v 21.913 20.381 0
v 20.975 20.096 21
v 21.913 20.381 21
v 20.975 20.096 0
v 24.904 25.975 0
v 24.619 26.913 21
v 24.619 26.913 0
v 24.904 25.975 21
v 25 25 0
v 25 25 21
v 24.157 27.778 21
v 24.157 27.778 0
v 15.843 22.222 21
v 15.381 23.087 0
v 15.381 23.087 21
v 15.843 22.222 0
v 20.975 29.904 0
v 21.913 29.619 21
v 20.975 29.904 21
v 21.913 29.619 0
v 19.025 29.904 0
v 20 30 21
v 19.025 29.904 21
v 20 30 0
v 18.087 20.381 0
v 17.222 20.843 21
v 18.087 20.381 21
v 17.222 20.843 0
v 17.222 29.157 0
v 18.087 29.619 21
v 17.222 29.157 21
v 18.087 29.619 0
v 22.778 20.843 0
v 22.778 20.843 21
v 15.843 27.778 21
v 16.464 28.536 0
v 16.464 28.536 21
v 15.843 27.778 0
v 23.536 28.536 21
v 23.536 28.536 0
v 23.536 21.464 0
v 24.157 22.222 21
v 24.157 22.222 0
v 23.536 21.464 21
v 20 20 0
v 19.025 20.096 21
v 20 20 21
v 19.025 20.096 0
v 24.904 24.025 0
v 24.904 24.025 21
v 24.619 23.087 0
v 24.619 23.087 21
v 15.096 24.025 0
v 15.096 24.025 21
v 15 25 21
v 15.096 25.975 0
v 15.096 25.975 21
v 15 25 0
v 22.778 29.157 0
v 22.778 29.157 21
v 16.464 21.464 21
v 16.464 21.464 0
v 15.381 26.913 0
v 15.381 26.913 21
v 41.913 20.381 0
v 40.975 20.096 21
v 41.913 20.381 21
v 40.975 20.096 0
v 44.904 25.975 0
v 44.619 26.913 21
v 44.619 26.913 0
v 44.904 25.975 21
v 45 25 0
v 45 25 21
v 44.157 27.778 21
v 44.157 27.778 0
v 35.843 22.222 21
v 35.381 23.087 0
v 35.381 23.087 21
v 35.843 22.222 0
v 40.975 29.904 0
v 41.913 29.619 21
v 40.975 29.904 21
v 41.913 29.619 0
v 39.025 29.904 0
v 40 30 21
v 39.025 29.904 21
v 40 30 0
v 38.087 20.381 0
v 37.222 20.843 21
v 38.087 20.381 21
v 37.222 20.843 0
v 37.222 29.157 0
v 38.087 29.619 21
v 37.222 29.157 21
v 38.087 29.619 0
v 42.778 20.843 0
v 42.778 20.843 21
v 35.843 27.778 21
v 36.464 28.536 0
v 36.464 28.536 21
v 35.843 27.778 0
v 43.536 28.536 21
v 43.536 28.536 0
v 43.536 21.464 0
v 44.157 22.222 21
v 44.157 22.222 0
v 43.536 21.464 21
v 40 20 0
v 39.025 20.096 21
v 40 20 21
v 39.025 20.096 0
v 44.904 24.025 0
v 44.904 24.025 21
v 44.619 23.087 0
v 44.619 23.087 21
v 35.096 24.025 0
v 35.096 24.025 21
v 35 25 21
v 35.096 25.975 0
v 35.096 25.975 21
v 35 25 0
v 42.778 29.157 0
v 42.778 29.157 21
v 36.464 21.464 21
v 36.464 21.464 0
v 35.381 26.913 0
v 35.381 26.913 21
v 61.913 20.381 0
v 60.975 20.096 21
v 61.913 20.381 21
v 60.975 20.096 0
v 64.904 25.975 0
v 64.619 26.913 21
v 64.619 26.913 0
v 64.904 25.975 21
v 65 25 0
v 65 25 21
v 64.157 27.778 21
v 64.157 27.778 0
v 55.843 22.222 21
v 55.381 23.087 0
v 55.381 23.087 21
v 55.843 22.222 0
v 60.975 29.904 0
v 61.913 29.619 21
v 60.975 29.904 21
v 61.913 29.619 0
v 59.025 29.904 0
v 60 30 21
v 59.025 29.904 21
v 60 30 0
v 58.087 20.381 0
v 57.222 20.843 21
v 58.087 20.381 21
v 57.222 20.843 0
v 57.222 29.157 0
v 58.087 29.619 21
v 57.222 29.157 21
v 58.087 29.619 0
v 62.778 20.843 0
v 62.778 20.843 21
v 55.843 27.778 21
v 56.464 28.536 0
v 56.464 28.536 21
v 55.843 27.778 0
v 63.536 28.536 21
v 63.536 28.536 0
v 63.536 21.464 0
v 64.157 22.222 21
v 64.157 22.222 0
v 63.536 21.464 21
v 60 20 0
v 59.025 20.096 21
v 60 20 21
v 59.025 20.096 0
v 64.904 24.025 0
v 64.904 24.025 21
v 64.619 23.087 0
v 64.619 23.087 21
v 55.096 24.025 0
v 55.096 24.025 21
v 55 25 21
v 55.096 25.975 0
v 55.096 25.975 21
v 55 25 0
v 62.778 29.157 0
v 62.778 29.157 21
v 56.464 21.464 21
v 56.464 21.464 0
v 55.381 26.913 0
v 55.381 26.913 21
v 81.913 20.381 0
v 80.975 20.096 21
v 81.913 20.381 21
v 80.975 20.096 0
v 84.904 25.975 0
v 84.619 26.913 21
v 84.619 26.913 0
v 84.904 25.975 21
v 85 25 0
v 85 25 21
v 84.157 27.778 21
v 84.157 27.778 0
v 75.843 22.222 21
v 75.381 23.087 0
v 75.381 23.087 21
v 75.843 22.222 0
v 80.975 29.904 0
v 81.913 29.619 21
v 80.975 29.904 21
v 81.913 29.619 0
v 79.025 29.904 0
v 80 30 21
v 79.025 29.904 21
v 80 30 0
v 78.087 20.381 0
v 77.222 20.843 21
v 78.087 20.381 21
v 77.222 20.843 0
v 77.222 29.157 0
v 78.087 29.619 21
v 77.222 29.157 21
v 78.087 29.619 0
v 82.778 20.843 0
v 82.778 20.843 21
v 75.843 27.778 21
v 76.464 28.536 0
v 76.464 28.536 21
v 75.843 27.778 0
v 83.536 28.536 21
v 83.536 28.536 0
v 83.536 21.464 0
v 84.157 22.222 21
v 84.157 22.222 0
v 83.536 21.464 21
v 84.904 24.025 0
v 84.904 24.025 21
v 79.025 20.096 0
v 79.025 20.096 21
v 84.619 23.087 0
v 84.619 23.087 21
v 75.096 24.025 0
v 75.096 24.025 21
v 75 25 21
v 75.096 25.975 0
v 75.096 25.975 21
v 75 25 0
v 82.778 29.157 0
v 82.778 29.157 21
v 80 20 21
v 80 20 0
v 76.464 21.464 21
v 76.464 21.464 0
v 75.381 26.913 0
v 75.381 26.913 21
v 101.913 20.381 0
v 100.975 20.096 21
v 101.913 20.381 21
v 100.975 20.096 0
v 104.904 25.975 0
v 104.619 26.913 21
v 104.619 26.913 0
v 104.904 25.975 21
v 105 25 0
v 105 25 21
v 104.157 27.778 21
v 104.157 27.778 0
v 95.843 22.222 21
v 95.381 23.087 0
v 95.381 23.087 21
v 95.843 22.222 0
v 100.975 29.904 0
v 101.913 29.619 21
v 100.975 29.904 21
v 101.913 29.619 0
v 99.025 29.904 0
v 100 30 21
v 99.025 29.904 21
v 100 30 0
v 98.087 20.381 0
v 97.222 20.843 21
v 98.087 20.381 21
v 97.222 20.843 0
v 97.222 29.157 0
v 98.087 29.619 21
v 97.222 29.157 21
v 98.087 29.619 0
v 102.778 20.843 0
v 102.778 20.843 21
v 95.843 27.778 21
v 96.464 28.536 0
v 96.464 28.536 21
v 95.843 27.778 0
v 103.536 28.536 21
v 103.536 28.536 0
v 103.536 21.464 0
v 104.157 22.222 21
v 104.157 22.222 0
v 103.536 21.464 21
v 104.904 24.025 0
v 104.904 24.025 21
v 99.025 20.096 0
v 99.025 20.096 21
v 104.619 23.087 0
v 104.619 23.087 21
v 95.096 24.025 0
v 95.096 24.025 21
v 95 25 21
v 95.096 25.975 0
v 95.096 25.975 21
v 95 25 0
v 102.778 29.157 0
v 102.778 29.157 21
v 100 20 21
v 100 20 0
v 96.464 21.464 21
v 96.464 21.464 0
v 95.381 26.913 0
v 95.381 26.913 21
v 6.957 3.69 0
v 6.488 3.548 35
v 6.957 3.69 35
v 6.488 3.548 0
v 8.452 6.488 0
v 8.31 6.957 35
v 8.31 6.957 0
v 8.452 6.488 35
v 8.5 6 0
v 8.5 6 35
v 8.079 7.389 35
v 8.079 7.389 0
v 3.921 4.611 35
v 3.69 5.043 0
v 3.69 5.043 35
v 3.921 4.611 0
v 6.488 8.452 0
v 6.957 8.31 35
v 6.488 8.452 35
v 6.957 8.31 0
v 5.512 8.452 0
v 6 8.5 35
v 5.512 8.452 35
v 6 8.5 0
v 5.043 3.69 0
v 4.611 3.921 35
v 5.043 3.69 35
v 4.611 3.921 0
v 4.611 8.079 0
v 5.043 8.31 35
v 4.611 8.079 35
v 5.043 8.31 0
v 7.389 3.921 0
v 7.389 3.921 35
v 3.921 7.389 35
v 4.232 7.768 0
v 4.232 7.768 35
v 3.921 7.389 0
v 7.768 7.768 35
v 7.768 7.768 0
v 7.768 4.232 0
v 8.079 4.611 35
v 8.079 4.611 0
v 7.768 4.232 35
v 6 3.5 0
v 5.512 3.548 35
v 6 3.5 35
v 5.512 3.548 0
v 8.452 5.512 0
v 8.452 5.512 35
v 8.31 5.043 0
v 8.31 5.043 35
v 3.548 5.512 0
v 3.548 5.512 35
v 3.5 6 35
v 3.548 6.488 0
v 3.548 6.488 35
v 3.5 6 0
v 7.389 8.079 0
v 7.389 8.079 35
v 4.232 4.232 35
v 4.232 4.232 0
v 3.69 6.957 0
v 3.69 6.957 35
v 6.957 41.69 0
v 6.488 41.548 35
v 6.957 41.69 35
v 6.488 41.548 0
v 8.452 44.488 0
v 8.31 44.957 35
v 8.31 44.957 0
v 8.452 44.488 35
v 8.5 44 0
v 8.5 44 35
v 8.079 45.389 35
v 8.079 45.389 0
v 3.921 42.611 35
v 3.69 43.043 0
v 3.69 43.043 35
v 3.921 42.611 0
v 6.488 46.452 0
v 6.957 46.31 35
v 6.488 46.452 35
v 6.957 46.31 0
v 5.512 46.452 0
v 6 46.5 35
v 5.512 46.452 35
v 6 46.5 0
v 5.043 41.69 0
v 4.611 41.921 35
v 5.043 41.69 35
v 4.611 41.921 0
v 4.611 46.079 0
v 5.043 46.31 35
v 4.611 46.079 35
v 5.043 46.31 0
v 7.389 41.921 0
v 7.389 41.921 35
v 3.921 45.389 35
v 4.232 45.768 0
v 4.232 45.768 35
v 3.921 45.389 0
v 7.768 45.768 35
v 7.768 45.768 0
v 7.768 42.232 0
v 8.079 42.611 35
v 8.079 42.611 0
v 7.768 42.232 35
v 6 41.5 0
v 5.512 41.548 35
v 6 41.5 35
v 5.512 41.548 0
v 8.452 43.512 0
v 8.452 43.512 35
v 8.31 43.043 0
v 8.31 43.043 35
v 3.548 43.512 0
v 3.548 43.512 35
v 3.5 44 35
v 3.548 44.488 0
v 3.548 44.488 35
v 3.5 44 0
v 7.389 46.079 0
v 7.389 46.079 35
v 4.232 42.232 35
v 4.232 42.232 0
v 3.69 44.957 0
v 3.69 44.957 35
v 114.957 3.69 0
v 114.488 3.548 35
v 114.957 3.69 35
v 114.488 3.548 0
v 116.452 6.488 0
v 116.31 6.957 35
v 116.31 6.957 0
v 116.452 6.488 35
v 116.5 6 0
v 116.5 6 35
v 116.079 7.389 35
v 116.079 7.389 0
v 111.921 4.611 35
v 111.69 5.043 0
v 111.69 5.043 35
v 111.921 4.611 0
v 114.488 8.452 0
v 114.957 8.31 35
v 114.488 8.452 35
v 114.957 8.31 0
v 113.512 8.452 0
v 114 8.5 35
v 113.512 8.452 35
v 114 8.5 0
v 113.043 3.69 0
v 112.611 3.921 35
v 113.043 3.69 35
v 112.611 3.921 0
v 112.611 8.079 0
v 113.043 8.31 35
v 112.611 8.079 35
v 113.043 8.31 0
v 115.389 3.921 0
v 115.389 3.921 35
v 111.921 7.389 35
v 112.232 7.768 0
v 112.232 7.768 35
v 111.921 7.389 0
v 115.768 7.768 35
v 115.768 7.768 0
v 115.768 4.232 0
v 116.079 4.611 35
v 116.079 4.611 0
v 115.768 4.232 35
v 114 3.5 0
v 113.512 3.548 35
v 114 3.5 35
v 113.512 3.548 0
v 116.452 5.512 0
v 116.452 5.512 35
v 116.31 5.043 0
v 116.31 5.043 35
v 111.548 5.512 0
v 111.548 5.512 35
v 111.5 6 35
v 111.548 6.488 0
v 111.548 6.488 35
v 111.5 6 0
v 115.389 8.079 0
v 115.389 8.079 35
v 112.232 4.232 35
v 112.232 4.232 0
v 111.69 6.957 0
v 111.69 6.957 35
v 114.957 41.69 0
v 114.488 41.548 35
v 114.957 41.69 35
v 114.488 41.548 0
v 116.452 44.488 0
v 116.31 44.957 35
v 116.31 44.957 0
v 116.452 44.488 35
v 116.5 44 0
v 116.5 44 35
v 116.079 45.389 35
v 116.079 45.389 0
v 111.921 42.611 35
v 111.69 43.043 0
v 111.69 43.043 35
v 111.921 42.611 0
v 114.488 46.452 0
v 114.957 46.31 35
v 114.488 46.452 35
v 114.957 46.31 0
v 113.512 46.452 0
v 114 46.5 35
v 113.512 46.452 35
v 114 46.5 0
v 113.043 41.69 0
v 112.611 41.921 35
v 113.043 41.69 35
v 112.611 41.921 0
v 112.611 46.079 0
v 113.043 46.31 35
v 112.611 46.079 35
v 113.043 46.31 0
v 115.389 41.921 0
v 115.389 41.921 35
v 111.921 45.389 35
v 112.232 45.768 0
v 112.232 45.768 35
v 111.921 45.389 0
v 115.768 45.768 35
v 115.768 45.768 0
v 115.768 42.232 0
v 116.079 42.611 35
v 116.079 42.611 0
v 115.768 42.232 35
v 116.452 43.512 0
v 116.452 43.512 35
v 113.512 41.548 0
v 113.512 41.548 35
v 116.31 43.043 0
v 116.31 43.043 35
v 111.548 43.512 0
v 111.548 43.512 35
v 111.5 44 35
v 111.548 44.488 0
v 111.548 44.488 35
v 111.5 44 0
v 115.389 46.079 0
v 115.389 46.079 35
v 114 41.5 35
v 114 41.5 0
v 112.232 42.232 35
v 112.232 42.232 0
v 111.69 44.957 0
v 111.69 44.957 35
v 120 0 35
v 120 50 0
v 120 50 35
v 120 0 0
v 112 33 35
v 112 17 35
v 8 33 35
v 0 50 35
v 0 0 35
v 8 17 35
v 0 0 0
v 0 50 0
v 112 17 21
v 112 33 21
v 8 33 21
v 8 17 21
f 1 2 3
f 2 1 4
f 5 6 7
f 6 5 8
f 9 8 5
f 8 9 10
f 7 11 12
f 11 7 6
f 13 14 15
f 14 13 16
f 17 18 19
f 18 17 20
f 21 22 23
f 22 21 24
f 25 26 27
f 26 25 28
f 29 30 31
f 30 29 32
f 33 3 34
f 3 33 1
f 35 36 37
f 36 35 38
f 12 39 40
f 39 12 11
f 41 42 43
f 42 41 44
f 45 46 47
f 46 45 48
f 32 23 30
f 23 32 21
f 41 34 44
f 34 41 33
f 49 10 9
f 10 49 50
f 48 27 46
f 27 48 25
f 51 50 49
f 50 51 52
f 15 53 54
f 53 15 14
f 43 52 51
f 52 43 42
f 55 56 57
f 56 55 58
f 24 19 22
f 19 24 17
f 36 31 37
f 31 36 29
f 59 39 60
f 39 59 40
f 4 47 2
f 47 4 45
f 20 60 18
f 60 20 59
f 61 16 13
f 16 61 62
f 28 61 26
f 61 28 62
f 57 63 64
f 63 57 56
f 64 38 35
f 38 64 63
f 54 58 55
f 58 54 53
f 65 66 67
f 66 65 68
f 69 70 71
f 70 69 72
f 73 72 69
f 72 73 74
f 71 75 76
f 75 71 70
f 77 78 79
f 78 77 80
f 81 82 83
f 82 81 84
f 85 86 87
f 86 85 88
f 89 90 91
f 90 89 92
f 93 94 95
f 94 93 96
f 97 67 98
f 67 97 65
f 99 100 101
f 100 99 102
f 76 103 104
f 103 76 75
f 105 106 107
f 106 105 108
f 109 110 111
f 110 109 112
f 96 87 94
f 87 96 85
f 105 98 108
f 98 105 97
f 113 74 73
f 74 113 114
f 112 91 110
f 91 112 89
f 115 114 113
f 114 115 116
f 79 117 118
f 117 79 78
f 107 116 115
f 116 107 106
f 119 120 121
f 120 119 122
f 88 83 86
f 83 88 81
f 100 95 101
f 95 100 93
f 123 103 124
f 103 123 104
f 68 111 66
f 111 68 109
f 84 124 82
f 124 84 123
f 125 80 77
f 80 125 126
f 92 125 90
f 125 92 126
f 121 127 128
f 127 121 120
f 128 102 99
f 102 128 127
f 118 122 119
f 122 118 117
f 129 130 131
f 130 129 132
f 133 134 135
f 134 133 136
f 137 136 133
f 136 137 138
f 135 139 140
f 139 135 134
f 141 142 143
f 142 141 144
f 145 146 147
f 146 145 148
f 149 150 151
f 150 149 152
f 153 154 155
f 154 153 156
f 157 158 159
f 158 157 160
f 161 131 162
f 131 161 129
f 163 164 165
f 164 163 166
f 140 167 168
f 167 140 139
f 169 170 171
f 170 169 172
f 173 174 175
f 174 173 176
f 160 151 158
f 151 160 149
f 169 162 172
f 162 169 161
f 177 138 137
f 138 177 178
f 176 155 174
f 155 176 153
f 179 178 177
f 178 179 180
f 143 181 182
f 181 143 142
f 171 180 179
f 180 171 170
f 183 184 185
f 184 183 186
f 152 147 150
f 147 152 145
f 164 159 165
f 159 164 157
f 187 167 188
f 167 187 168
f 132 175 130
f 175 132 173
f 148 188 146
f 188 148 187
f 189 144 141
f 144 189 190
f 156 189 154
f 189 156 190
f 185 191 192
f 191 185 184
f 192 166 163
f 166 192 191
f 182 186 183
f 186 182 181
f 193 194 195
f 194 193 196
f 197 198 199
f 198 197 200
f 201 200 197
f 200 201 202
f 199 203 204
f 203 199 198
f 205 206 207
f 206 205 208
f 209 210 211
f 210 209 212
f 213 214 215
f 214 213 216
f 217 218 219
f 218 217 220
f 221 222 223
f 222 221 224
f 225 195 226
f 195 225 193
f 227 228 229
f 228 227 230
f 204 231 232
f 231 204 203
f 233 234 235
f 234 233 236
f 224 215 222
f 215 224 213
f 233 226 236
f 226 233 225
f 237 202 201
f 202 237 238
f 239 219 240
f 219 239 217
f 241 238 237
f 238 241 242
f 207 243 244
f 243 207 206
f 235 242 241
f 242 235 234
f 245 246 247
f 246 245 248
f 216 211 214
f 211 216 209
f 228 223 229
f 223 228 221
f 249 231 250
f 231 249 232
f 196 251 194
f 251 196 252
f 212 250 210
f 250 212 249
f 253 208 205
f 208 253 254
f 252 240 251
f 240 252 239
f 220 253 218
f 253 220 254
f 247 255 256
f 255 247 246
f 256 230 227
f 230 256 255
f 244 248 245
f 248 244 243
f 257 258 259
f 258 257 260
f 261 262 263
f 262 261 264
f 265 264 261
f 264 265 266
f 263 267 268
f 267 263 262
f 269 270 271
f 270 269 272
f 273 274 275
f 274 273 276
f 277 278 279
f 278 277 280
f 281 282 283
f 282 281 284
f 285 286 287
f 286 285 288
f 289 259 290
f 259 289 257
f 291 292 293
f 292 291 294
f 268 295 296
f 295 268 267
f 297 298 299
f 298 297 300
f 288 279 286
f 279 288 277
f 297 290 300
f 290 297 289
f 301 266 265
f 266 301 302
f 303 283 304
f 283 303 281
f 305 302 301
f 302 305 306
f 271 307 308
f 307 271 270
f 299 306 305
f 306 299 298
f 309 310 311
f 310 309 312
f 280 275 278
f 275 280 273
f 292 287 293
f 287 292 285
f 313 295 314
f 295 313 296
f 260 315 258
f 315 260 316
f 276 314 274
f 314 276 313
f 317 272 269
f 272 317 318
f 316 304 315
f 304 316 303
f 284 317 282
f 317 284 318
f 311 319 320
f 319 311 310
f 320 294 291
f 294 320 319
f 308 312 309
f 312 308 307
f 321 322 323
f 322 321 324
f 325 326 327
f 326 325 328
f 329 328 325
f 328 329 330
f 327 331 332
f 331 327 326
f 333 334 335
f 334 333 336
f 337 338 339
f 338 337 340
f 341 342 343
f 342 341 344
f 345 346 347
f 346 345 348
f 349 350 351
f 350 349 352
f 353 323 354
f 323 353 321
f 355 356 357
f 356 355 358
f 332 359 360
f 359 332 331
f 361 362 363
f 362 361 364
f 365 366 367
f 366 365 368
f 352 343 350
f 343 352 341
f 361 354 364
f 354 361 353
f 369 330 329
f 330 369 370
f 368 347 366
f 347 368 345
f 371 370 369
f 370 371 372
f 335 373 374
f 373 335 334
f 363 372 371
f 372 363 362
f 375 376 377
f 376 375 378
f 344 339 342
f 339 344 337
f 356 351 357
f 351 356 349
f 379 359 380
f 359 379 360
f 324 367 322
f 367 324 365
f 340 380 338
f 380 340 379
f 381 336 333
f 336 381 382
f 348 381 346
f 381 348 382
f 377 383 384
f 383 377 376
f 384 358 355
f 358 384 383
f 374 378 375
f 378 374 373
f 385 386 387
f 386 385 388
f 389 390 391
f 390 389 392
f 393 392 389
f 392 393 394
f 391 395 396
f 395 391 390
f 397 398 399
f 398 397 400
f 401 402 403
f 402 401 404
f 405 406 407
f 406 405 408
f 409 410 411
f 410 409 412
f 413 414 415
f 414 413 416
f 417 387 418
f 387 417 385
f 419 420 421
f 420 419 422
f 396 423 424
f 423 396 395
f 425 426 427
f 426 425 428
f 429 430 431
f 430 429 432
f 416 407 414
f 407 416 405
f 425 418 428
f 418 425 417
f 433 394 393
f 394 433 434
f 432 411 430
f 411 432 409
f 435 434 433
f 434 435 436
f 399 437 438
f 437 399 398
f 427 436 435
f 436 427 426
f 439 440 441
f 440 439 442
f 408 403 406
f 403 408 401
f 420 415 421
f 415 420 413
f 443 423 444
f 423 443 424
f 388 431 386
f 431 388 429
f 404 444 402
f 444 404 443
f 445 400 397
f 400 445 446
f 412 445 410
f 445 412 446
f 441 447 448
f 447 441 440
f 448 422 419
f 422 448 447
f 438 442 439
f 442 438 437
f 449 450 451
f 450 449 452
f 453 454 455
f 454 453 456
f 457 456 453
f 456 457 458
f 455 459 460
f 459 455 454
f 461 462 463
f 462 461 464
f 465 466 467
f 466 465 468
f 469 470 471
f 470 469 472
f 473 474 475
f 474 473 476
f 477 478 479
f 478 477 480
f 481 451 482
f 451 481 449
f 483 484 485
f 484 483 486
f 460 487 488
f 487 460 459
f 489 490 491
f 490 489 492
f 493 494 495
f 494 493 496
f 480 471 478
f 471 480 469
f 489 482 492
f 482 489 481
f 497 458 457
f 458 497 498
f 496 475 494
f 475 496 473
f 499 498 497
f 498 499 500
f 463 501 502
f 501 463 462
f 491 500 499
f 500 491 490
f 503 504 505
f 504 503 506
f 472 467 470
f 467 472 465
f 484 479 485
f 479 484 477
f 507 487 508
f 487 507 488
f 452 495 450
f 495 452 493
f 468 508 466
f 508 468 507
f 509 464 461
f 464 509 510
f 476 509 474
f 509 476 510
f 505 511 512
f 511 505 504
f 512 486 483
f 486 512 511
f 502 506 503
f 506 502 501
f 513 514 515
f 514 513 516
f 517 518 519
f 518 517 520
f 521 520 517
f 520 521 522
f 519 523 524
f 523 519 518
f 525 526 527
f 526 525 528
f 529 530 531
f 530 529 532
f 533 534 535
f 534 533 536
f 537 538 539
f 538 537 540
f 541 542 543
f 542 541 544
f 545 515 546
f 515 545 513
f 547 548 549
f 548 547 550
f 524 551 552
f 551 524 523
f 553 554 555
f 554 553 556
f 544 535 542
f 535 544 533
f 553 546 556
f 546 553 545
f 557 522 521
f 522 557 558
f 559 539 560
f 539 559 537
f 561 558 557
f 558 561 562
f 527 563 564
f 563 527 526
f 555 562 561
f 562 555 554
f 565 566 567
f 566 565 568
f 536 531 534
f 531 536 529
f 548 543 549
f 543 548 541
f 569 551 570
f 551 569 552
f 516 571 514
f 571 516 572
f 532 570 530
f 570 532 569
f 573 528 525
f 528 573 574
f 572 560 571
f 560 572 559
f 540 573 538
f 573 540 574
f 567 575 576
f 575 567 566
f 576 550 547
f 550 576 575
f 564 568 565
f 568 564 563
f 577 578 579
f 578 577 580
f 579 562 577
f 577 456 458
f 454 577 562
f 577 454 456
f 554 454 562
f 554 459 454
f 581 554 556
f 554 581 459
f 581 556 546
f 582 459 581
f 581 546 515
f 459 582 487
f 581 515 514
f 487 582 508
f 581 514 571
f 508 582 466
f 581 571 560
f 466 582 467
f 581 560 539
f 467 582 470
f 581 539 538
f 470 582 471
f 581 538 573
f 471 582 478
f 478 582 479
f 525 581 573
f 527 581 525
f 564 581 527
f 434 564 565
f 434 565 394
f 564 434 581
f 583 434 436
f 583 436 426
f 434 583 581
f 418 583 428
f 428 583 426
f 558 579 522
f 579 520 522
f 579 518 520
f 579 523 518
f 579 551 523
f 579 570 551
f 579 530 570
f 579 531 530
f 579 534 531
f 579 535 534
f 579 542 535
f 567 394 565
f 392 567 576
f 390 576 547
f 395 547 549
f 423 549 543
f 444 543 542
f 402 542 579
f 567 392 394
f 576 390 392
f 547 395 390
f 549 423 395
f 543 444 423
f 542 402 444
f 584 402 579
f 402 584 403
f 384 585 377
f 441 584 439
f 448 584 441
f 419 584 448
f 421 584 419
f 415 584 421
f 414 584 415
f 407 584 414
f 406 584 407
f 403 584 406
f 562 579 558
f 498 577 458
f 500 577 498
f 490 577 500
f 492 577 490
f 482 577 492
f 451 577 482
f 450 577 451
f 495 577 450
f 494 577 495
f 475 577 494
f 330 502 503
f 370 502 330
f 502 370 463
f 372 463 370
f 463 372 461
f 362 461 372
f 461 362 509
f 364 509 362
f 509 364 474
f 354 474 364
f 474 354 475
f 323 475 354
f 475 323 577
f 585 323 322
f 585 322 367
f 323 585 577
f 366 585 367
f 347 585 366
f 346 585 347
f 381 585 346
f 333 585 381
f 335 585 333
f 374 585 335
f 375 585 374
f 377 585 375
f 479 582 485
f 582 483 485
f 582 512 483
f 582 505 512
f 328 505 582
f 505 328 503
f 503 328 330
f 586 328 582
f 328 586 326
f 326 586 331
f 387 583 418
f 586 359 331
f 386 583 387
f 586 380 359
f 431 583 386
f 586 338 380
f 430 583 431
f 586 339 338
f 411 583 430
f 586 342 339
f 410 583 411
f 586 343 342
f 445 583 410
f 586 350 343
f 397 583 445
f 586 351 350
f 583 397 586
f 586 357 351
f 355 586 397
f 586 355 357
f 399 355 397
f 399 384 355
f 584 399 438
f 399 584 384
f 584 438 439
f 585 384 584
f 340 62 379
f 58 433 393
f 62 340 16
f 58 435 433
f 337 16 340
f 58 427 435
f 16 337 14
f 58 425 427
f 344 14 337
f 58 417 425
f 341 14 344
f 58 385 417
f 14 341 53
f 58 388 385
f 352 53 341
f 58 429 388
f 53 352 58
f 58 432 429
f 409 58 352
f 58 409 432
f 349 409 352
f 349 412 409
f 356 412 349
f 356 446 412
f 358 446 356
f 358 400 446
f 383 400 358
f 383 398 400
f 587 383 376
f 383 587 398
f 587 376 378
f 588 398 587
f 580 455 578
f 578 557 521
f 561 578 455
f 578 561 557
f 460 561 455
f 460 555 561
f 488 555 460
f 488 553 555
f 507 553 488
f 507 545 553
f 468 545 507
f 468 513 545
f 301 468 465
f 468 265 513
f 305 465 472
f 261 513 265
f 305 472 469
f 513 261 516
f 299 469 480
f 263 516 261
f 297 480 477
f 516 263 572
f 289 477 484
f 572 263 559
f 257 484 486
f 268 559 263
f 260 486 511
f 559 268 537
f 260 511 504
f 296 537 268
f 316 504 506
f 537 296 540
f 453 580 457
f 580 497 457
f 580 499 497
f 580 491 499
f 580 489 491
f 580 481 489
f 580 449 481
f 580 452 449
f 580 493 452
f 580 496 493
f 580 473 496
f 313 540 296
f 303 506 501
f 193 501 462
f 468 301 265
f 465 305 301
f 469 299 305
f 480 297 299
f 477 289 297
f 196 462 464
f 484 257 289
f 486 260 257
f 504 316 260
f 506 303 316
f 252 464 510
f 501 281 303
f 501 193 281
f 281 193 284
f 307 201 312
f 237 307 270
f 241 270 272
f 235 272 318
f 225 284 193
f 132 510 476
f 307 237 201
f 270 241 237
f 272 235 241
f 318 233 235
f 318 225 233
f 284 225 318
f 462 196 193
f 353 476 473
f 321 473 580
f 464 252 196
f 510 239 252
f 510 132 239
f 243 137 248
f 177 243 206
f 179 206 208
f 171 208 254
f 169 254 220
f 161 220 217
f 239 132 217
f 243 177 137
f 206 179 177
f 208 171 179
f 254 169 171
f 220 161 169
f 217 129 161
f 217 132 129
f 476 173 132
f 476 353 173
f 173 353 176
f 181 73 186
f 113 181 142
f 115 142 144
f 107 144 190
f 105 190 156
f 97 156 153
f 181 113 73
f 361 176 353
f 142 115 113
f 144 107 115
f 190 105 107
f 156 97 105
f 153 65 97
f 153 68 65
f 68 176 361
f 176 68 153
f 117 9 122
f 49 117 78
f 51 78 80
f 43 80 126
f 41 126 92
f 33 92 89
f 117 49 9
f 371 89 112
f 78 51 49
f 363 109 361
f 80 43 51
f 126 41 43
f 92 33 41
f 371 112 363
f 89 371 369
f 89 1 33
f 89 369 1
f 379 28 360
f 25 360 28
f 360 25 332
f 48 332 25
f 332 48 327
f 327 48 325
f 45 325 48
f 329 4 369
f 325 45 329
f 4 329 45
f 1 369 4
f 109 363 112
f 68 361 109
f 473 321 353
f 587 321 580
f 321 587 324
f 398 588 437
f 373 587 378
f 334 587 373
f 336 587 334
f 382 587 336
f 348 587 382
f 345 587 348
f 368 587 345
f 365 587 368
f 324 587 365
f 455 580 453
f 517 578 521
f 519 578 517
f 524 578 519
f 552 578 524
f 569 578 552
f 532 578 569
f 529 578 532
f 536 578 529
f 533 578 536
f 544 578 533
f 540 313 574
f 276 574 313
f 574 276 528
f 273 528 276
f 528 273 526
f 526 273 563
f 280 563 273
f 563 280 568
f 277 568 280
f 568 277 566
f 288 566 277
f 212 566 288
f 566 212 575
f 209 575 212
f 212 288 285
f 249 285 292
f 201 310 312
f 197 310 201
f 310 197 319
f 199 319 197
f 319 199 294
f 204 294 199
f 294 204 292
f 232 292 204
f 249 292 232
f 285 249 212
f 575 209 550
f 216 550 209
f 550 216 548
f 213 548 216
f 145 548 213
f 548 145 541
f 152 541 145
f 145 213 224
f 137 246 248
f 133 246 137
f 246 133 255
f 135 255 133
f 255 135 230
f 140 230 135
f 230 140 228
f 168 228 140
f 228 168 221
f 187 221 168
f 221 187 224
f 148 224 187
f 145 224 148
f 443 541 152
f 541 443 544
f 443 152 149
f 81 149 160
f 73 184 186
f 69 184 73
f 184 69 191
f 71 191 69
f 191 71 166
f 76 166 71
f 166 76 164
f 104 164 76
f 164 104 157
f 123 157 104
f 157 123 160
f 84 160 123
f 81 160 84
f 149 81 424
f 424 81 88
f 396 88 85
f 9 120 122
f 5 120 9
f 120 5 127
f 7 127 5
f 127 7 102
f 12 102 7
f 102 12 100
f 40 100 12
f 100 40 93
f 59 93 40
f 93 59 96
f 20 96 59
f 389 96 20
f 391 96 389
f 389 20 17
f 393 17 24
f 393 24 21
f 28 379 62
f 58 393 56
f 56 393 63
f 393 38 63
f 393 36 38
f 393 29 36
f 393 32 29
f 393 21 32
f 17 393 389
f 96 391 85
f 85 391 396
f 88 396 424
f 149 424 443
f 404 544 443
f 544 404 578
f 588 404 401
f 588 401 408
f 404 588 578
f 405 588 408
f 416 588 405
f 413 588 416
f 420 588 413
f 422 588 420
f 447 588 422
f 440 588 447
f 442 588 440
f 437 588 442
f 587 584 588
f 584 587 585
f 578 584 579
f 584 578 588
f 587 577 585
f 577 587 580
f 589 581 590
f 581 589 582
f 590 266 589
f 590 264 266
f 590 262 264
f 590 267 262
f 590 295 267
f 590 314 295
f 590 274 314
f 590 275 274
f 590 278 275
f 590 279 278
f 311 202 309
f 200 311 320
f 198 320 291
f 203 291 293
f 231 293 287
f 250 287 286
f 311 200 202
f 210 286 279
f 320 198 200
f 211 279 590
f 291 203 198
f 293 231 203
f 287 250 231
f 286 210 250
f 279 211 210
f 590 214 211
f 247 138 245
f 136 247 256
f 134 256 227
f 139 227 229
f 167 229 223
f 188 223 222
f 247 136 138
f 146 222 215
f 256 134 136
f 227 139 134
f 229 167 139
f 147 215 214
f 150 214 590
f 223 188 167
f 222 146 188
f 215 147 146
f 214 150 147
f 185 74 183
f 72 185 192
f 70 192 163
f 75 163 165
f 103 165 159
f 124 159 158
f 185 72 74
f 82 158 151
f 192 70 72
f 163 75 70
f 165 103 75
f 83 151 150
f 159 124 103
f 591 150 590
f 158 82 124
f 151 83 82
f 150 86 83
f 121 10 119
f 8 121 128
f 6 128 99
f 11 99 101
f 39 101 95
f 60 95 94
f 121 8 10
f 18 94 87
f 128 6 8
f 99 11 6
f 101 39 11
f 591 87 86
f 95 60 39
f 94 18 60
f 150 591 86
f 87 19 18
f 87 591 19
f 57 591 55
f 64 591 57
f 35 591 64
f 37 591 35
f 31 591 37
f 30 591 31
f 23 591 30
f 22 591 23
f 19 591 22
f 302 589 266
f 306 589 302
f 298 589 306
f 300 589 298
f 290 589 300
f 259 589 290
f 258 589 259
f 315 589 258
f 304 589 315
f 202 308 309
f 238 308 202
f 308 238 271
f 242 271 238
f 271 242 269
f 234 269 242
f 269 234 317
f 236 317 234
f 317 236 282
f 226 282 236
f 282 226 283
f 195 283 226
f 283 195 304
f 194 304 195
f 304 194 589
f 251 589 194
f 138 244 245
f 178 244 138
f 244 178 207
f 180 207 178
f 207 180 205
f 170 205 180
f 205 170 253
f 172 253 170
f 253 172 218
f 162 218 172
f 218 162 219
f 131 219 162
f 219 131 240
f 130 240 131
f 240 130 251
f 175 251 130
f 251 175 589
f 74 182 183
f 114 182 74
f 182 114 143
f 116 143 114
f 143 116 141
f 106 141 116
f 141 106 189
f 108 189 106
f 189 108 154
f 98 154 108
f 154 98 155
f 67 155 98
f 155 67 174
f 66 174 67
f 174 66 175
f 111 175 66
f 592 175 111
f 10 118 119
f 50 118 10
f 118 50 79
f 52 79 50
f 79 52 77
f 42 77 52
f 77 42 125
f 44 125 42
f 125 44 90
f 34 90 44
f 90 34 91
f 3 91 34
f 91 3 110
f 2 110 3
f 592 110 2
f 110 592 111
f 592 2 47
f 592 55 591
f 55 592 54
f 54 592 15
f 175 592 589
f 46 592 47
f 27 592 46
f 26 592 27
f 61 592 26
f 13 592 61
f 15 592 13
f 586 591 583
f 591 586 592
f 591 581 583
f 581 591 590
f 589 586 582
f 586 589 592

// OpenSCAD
$fn = 32;

// ----------------------------------------------------------------------
// Manifold block: gallery_top manifold
// ----------------------------------------------------------------------

// --- parameters (mm) ---
block_l = 120;            // block length, X
block_w = 50;             // block width, Y
block_h = 35;             // block height, Z
port_d = 10;              // port bore diameter
port_pitch = 20;          // port pitch along X
gallery_d = 16;           // top gallery width, Y
gallery_depth = 14;       // gallery pocket depth
wall_p = 8;               // gallery end wall thickness, X
mnt_d = 5;                // mounting hole diameter
mnt_in = 6;               // mounting hole inset from the edges

n_ports = 5;  // ports in the row
port_x0 = (block_l - (n_ports - 1) * port_pitch) / 2;  // first port X

difference() {
  cube([block_l, block_w, block_h]);
  for (i = [0 : n_ports - 1])
    translate([port_x0 + i * port_pitch, block_w / 2, -1])
      cylinder(h = block_h + 2, d = port_d);
  translate([wall_p, block_w / 2 - gallery_d / 2, block_h - gallery_depth])
    cube([block_l - 2 * wall_p, gallery_d, gallery_depth + 1]);
  for (cx = [mnt_in, block_l - mnt_in])
    for (cy = [mnt_in, block_w - mnt_in])
      translate([cx, cy, -1]) cylinder(h = block_h + 2, d = mnt_d);
}
